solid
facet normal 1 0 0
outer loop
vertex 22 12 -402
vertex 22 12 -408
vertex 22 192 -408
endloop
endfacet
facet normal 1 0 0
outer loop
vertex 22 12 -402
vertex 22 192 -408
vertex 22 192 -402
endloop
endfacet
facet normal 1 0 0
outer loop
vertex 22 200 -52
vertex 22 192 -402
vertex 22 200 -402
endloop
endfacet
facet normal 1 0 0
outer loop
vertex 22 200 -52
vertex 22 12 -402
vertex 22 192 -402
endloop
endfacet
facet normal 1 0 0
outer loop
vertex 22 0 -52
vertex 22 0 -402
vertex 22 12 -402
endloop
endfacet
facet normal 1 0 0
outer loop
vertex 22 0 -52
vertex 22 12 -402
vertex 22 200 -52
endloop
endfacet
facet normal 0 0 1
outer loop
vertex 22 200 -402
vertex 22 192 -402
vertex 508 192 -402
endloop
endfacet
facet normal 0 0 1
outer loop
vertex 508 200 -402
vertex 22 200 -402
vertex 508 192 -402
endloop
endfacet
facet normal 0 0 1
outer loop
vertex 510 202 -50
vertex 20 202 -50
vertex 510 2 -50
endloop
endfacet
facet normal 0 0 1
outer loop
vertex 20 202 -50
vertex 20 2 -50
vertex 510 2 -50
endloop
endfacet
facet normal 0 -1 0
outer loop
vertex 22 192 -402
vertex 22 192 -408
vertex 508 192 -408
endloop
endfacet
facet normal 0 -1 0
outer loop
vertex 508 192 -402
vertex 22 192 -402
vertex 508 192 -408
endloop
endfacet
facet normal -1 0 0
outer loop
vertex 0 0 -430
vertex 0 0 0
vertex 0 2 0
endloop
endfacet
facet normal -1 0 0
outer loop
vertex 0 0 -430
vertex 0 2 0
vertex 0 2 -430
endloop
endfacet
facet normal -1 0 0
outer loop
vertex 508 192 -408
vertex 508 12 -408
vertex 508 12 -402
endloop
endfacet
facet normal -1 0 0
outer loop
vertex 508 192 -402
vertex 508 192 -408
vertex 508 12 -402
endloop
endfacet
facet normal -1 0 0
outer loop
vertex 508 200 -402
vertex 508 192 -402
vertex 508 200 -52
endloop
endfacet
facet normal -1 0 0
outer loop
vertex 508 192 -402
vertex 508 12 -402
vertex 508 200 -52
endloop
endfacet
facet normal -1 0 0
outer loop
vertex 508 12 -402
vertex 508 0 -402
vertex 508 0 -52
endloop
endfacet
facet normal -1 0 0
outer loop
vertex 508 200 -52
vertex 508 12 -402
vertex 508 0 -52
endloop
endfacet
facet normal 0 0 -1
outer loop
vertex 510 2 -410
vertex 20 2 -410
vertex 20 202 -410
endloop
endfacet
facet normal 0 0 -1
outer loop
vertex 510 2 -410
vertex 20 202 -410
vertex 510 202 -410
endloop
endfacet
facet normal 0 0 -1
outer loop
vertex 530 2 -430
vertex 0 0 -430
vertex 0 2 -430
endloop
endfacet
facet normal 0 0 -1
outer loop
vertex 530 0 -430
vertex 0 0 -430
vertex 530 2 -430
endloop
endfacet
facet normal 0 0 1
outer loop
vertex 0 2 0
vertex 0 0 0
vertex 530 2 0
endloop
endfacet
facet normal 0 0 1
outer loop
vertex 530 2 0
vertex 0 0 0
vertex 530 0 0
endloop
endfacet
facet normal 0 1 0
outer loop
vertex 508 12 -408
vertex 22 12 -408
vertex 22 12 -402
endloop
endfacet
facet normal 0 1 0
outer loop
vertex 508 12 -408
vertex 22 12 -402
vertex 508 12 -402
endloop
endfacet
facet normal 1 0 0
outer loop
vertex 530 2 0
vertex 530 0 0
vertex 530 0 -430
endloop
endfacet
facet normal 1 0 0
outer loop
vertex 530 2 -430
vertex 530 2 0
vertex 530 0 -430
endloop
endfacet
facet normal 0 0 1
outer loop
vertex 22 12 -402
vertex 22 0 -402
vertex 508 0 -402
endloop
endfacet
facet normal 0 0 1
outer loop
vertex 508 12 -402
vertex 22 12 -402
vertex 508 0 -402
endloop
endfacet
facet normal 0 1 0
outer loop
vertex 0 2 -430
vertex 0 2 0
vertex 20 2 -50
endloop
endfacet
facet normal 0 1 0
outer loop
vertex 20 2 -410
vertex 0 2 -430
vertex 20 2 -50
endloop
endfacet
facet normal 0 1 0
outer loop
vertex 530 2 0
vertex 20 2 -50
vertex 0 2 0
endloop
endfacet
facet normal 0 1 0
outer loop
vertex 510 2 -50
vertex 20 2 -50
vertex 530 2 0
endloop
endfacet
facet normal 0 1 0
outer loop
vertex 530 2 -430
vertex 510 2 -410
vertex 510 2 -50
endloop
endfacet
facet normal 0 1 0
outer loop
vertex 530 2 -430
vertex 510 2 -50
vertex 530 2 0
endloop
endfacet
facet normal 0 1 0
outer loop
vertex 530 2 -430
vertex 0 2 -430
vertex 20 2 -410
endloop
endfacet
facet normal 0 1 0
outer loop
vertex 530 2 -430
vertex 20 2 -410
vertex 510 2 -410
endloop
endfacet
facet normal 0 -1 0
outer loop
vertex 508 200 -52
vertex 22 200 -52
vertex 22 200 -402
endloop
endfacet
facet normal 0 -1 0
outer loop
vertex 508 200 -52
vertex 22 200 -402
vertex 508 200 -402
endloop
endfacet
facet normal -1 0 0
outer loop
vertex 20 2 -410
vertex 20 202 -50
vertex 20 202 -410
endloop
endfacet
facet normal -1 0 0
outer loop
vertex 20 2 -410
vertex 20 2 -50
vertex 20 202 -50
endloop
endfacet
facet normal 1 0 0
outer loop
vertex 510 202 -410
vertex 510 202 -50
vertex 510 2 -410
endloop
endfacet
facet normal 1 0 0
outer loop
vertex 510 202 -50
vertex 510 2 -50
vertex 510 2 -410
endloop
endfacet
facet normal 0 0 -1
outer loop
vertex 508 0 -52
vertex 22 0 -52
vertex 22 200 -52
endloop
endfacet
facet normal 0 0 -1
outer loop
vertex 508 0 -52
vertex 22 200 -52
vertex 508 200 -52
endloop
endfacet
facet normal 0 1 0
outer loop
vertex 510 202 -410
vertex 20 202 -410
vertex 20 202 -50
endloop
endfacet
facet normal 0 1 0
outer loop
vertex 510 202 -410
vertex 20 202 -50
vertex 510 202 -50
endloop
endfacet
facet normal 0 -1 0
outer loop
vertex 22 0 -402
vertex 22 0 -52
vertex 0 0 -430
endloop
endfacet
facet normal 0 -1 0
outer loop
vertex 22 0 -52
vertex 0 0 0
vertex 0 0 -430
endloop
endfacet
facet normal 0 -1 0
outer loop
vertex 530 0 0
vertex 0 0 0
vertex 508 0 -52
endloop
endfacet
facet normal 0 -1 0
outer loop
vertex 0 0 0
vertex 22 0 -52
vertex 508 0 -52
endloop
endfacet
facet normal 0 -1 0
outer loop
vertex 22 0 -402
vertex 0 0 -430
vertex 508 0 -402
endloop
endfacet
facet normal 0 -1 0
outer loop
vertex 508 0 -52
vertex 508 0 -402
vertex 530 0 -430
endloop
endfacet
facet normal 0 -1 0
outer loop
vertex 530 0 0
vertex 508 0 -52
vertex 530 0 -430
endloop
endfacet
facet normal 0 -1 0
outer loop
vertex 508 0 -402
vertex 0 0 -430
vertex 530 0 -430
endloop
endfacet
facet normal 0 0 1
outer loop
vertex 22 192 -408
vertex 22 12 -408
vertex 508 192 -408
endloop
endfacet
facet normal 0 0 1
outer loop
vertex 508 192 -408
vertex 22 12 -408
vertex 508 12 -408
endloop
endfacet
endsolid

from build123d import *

# Parameters (mm, degrees)
SKETCH_1_W                = 530
SKETCH_1_H                = 430
EXTRUDE_1_DEPTH           = 2
EXTRUDE_1_2_OUTLINE_W     = 490
EXTRUDE_1_2_OUTLINE_H     = 360
EXTRUDE_1_2_DEPTH         = 10
EXTRUDE_START             = 190
EXTRUDE_1_2_2_OUTLINE_W   = 490
EXTRUDE_1_2_2_OUTLINE_H   = 360
EXTRUDE_1_2_2_DEPTH       = 10
EXTRUDE_START_2           = 10
EXTRUDE_1_2_3_OUTLINE_W   = 490
EXTRUDE_1_2_3_OUTLINE_H   = 360
EXTRUDE_1_2_3_OUTLINE_W_2 = 486
EXTRUDE_1_2_3_OUTLINE_H_2 = 356
EXTRUDE_1_2_3_DEPTH       = 180
SKETCH_3_W                = 486
SKETCH_3_H                = 350
CUT_EXTRUDE_1_DEPTH       = 200


# Read off the part's stored shape, not the designer's step: Вытянуть-Тонкостенный1
with BuildPart() as part:
    # Эскиз1 → Extrude 1 (new body)
    with BuildSketch(Plane(origin=(0, 0, 0), x_dir=(1, 0, 0), z_dir=(0, 1, 0))):
        with Locations((265, 215)):
            Rectangle(SKETCH_1_W, SKETCH_1_H)
    extrude(amount=EXTRUDE_1_DEPTH)

    # Extrude 1 2 outline → Extrude 1 2 (add)
    with BuildSketch(Plane(origin=(0, 2, 0), x_dir=(1, 0, 0), z_dir=(0, 1, 0))):
        with Locations((265, 230)):
            Rectangle(EXTRUDE_1_2_OUTLINE_W, EXTRUDE_1_2_OUTLINE_H)
    extrude(amount=EXTRUDE_1_2_DEPTH)



with BuildPart() as body_2:
    # Extrude 1 2 2 outline → Extrude 1 2 2 (new body)
    with BuildSketch(Plane(origin=(0, 2, 0), x_dir=(1, 0, 0), z_dir=(0, 1, 0)).offset(EXTRUDE_START)):
        with Locations((265, 230)):
            Rectangle(EXTRUDE_1_2_2_OUTLINE_W, EXTRUDE_1_2_2_OUTLINE_H)
    extrude(amount=EXTRUDE_1_2_2_DEPTH)


with BuildPart() as part_1:
    add(part.part)

    add(body_2.part)  # Extrude 1 2 3 merges body 2
    # Extrude 1 2 3 outline → Extrude 1 2 3 (add)
    with BuildSketch(Plane(origin=(0, 2, 0), x_dir=(1, 0, 0), z_dir=(0, 1, 0)).offset(EXTRUDE_START_2)):
        with Locations((265, 230)):
            Rectangle(EXTRUDE_1_2_3_OUTLINE_W, EXTRUDE_1_2_3_OUTLINE_H)
        with Locations((265, 230)):
            Rectangle(EXTRUDE_1_2_3_OUTLINE_W_2, EXTRUDE_1_2_3_OUTLINE_H_2, mode=Mode.SUBTRACT)
    extrude(amount=EXTRUDE_1_2_3_DEPTH)

    # Эскиз3 → Вырез-Вытянуть1 (cut)
    with BuildSketch(Plane.XZ):
        with Locations((265, -227)):
            Rectangle(SKETCH_3_W, SKETCH_3_H)
    extrude(amount=-CUT_EXTRUDE_1_DEPTH, mode=Mode.SUBTRACT)


solid = part_1.part
